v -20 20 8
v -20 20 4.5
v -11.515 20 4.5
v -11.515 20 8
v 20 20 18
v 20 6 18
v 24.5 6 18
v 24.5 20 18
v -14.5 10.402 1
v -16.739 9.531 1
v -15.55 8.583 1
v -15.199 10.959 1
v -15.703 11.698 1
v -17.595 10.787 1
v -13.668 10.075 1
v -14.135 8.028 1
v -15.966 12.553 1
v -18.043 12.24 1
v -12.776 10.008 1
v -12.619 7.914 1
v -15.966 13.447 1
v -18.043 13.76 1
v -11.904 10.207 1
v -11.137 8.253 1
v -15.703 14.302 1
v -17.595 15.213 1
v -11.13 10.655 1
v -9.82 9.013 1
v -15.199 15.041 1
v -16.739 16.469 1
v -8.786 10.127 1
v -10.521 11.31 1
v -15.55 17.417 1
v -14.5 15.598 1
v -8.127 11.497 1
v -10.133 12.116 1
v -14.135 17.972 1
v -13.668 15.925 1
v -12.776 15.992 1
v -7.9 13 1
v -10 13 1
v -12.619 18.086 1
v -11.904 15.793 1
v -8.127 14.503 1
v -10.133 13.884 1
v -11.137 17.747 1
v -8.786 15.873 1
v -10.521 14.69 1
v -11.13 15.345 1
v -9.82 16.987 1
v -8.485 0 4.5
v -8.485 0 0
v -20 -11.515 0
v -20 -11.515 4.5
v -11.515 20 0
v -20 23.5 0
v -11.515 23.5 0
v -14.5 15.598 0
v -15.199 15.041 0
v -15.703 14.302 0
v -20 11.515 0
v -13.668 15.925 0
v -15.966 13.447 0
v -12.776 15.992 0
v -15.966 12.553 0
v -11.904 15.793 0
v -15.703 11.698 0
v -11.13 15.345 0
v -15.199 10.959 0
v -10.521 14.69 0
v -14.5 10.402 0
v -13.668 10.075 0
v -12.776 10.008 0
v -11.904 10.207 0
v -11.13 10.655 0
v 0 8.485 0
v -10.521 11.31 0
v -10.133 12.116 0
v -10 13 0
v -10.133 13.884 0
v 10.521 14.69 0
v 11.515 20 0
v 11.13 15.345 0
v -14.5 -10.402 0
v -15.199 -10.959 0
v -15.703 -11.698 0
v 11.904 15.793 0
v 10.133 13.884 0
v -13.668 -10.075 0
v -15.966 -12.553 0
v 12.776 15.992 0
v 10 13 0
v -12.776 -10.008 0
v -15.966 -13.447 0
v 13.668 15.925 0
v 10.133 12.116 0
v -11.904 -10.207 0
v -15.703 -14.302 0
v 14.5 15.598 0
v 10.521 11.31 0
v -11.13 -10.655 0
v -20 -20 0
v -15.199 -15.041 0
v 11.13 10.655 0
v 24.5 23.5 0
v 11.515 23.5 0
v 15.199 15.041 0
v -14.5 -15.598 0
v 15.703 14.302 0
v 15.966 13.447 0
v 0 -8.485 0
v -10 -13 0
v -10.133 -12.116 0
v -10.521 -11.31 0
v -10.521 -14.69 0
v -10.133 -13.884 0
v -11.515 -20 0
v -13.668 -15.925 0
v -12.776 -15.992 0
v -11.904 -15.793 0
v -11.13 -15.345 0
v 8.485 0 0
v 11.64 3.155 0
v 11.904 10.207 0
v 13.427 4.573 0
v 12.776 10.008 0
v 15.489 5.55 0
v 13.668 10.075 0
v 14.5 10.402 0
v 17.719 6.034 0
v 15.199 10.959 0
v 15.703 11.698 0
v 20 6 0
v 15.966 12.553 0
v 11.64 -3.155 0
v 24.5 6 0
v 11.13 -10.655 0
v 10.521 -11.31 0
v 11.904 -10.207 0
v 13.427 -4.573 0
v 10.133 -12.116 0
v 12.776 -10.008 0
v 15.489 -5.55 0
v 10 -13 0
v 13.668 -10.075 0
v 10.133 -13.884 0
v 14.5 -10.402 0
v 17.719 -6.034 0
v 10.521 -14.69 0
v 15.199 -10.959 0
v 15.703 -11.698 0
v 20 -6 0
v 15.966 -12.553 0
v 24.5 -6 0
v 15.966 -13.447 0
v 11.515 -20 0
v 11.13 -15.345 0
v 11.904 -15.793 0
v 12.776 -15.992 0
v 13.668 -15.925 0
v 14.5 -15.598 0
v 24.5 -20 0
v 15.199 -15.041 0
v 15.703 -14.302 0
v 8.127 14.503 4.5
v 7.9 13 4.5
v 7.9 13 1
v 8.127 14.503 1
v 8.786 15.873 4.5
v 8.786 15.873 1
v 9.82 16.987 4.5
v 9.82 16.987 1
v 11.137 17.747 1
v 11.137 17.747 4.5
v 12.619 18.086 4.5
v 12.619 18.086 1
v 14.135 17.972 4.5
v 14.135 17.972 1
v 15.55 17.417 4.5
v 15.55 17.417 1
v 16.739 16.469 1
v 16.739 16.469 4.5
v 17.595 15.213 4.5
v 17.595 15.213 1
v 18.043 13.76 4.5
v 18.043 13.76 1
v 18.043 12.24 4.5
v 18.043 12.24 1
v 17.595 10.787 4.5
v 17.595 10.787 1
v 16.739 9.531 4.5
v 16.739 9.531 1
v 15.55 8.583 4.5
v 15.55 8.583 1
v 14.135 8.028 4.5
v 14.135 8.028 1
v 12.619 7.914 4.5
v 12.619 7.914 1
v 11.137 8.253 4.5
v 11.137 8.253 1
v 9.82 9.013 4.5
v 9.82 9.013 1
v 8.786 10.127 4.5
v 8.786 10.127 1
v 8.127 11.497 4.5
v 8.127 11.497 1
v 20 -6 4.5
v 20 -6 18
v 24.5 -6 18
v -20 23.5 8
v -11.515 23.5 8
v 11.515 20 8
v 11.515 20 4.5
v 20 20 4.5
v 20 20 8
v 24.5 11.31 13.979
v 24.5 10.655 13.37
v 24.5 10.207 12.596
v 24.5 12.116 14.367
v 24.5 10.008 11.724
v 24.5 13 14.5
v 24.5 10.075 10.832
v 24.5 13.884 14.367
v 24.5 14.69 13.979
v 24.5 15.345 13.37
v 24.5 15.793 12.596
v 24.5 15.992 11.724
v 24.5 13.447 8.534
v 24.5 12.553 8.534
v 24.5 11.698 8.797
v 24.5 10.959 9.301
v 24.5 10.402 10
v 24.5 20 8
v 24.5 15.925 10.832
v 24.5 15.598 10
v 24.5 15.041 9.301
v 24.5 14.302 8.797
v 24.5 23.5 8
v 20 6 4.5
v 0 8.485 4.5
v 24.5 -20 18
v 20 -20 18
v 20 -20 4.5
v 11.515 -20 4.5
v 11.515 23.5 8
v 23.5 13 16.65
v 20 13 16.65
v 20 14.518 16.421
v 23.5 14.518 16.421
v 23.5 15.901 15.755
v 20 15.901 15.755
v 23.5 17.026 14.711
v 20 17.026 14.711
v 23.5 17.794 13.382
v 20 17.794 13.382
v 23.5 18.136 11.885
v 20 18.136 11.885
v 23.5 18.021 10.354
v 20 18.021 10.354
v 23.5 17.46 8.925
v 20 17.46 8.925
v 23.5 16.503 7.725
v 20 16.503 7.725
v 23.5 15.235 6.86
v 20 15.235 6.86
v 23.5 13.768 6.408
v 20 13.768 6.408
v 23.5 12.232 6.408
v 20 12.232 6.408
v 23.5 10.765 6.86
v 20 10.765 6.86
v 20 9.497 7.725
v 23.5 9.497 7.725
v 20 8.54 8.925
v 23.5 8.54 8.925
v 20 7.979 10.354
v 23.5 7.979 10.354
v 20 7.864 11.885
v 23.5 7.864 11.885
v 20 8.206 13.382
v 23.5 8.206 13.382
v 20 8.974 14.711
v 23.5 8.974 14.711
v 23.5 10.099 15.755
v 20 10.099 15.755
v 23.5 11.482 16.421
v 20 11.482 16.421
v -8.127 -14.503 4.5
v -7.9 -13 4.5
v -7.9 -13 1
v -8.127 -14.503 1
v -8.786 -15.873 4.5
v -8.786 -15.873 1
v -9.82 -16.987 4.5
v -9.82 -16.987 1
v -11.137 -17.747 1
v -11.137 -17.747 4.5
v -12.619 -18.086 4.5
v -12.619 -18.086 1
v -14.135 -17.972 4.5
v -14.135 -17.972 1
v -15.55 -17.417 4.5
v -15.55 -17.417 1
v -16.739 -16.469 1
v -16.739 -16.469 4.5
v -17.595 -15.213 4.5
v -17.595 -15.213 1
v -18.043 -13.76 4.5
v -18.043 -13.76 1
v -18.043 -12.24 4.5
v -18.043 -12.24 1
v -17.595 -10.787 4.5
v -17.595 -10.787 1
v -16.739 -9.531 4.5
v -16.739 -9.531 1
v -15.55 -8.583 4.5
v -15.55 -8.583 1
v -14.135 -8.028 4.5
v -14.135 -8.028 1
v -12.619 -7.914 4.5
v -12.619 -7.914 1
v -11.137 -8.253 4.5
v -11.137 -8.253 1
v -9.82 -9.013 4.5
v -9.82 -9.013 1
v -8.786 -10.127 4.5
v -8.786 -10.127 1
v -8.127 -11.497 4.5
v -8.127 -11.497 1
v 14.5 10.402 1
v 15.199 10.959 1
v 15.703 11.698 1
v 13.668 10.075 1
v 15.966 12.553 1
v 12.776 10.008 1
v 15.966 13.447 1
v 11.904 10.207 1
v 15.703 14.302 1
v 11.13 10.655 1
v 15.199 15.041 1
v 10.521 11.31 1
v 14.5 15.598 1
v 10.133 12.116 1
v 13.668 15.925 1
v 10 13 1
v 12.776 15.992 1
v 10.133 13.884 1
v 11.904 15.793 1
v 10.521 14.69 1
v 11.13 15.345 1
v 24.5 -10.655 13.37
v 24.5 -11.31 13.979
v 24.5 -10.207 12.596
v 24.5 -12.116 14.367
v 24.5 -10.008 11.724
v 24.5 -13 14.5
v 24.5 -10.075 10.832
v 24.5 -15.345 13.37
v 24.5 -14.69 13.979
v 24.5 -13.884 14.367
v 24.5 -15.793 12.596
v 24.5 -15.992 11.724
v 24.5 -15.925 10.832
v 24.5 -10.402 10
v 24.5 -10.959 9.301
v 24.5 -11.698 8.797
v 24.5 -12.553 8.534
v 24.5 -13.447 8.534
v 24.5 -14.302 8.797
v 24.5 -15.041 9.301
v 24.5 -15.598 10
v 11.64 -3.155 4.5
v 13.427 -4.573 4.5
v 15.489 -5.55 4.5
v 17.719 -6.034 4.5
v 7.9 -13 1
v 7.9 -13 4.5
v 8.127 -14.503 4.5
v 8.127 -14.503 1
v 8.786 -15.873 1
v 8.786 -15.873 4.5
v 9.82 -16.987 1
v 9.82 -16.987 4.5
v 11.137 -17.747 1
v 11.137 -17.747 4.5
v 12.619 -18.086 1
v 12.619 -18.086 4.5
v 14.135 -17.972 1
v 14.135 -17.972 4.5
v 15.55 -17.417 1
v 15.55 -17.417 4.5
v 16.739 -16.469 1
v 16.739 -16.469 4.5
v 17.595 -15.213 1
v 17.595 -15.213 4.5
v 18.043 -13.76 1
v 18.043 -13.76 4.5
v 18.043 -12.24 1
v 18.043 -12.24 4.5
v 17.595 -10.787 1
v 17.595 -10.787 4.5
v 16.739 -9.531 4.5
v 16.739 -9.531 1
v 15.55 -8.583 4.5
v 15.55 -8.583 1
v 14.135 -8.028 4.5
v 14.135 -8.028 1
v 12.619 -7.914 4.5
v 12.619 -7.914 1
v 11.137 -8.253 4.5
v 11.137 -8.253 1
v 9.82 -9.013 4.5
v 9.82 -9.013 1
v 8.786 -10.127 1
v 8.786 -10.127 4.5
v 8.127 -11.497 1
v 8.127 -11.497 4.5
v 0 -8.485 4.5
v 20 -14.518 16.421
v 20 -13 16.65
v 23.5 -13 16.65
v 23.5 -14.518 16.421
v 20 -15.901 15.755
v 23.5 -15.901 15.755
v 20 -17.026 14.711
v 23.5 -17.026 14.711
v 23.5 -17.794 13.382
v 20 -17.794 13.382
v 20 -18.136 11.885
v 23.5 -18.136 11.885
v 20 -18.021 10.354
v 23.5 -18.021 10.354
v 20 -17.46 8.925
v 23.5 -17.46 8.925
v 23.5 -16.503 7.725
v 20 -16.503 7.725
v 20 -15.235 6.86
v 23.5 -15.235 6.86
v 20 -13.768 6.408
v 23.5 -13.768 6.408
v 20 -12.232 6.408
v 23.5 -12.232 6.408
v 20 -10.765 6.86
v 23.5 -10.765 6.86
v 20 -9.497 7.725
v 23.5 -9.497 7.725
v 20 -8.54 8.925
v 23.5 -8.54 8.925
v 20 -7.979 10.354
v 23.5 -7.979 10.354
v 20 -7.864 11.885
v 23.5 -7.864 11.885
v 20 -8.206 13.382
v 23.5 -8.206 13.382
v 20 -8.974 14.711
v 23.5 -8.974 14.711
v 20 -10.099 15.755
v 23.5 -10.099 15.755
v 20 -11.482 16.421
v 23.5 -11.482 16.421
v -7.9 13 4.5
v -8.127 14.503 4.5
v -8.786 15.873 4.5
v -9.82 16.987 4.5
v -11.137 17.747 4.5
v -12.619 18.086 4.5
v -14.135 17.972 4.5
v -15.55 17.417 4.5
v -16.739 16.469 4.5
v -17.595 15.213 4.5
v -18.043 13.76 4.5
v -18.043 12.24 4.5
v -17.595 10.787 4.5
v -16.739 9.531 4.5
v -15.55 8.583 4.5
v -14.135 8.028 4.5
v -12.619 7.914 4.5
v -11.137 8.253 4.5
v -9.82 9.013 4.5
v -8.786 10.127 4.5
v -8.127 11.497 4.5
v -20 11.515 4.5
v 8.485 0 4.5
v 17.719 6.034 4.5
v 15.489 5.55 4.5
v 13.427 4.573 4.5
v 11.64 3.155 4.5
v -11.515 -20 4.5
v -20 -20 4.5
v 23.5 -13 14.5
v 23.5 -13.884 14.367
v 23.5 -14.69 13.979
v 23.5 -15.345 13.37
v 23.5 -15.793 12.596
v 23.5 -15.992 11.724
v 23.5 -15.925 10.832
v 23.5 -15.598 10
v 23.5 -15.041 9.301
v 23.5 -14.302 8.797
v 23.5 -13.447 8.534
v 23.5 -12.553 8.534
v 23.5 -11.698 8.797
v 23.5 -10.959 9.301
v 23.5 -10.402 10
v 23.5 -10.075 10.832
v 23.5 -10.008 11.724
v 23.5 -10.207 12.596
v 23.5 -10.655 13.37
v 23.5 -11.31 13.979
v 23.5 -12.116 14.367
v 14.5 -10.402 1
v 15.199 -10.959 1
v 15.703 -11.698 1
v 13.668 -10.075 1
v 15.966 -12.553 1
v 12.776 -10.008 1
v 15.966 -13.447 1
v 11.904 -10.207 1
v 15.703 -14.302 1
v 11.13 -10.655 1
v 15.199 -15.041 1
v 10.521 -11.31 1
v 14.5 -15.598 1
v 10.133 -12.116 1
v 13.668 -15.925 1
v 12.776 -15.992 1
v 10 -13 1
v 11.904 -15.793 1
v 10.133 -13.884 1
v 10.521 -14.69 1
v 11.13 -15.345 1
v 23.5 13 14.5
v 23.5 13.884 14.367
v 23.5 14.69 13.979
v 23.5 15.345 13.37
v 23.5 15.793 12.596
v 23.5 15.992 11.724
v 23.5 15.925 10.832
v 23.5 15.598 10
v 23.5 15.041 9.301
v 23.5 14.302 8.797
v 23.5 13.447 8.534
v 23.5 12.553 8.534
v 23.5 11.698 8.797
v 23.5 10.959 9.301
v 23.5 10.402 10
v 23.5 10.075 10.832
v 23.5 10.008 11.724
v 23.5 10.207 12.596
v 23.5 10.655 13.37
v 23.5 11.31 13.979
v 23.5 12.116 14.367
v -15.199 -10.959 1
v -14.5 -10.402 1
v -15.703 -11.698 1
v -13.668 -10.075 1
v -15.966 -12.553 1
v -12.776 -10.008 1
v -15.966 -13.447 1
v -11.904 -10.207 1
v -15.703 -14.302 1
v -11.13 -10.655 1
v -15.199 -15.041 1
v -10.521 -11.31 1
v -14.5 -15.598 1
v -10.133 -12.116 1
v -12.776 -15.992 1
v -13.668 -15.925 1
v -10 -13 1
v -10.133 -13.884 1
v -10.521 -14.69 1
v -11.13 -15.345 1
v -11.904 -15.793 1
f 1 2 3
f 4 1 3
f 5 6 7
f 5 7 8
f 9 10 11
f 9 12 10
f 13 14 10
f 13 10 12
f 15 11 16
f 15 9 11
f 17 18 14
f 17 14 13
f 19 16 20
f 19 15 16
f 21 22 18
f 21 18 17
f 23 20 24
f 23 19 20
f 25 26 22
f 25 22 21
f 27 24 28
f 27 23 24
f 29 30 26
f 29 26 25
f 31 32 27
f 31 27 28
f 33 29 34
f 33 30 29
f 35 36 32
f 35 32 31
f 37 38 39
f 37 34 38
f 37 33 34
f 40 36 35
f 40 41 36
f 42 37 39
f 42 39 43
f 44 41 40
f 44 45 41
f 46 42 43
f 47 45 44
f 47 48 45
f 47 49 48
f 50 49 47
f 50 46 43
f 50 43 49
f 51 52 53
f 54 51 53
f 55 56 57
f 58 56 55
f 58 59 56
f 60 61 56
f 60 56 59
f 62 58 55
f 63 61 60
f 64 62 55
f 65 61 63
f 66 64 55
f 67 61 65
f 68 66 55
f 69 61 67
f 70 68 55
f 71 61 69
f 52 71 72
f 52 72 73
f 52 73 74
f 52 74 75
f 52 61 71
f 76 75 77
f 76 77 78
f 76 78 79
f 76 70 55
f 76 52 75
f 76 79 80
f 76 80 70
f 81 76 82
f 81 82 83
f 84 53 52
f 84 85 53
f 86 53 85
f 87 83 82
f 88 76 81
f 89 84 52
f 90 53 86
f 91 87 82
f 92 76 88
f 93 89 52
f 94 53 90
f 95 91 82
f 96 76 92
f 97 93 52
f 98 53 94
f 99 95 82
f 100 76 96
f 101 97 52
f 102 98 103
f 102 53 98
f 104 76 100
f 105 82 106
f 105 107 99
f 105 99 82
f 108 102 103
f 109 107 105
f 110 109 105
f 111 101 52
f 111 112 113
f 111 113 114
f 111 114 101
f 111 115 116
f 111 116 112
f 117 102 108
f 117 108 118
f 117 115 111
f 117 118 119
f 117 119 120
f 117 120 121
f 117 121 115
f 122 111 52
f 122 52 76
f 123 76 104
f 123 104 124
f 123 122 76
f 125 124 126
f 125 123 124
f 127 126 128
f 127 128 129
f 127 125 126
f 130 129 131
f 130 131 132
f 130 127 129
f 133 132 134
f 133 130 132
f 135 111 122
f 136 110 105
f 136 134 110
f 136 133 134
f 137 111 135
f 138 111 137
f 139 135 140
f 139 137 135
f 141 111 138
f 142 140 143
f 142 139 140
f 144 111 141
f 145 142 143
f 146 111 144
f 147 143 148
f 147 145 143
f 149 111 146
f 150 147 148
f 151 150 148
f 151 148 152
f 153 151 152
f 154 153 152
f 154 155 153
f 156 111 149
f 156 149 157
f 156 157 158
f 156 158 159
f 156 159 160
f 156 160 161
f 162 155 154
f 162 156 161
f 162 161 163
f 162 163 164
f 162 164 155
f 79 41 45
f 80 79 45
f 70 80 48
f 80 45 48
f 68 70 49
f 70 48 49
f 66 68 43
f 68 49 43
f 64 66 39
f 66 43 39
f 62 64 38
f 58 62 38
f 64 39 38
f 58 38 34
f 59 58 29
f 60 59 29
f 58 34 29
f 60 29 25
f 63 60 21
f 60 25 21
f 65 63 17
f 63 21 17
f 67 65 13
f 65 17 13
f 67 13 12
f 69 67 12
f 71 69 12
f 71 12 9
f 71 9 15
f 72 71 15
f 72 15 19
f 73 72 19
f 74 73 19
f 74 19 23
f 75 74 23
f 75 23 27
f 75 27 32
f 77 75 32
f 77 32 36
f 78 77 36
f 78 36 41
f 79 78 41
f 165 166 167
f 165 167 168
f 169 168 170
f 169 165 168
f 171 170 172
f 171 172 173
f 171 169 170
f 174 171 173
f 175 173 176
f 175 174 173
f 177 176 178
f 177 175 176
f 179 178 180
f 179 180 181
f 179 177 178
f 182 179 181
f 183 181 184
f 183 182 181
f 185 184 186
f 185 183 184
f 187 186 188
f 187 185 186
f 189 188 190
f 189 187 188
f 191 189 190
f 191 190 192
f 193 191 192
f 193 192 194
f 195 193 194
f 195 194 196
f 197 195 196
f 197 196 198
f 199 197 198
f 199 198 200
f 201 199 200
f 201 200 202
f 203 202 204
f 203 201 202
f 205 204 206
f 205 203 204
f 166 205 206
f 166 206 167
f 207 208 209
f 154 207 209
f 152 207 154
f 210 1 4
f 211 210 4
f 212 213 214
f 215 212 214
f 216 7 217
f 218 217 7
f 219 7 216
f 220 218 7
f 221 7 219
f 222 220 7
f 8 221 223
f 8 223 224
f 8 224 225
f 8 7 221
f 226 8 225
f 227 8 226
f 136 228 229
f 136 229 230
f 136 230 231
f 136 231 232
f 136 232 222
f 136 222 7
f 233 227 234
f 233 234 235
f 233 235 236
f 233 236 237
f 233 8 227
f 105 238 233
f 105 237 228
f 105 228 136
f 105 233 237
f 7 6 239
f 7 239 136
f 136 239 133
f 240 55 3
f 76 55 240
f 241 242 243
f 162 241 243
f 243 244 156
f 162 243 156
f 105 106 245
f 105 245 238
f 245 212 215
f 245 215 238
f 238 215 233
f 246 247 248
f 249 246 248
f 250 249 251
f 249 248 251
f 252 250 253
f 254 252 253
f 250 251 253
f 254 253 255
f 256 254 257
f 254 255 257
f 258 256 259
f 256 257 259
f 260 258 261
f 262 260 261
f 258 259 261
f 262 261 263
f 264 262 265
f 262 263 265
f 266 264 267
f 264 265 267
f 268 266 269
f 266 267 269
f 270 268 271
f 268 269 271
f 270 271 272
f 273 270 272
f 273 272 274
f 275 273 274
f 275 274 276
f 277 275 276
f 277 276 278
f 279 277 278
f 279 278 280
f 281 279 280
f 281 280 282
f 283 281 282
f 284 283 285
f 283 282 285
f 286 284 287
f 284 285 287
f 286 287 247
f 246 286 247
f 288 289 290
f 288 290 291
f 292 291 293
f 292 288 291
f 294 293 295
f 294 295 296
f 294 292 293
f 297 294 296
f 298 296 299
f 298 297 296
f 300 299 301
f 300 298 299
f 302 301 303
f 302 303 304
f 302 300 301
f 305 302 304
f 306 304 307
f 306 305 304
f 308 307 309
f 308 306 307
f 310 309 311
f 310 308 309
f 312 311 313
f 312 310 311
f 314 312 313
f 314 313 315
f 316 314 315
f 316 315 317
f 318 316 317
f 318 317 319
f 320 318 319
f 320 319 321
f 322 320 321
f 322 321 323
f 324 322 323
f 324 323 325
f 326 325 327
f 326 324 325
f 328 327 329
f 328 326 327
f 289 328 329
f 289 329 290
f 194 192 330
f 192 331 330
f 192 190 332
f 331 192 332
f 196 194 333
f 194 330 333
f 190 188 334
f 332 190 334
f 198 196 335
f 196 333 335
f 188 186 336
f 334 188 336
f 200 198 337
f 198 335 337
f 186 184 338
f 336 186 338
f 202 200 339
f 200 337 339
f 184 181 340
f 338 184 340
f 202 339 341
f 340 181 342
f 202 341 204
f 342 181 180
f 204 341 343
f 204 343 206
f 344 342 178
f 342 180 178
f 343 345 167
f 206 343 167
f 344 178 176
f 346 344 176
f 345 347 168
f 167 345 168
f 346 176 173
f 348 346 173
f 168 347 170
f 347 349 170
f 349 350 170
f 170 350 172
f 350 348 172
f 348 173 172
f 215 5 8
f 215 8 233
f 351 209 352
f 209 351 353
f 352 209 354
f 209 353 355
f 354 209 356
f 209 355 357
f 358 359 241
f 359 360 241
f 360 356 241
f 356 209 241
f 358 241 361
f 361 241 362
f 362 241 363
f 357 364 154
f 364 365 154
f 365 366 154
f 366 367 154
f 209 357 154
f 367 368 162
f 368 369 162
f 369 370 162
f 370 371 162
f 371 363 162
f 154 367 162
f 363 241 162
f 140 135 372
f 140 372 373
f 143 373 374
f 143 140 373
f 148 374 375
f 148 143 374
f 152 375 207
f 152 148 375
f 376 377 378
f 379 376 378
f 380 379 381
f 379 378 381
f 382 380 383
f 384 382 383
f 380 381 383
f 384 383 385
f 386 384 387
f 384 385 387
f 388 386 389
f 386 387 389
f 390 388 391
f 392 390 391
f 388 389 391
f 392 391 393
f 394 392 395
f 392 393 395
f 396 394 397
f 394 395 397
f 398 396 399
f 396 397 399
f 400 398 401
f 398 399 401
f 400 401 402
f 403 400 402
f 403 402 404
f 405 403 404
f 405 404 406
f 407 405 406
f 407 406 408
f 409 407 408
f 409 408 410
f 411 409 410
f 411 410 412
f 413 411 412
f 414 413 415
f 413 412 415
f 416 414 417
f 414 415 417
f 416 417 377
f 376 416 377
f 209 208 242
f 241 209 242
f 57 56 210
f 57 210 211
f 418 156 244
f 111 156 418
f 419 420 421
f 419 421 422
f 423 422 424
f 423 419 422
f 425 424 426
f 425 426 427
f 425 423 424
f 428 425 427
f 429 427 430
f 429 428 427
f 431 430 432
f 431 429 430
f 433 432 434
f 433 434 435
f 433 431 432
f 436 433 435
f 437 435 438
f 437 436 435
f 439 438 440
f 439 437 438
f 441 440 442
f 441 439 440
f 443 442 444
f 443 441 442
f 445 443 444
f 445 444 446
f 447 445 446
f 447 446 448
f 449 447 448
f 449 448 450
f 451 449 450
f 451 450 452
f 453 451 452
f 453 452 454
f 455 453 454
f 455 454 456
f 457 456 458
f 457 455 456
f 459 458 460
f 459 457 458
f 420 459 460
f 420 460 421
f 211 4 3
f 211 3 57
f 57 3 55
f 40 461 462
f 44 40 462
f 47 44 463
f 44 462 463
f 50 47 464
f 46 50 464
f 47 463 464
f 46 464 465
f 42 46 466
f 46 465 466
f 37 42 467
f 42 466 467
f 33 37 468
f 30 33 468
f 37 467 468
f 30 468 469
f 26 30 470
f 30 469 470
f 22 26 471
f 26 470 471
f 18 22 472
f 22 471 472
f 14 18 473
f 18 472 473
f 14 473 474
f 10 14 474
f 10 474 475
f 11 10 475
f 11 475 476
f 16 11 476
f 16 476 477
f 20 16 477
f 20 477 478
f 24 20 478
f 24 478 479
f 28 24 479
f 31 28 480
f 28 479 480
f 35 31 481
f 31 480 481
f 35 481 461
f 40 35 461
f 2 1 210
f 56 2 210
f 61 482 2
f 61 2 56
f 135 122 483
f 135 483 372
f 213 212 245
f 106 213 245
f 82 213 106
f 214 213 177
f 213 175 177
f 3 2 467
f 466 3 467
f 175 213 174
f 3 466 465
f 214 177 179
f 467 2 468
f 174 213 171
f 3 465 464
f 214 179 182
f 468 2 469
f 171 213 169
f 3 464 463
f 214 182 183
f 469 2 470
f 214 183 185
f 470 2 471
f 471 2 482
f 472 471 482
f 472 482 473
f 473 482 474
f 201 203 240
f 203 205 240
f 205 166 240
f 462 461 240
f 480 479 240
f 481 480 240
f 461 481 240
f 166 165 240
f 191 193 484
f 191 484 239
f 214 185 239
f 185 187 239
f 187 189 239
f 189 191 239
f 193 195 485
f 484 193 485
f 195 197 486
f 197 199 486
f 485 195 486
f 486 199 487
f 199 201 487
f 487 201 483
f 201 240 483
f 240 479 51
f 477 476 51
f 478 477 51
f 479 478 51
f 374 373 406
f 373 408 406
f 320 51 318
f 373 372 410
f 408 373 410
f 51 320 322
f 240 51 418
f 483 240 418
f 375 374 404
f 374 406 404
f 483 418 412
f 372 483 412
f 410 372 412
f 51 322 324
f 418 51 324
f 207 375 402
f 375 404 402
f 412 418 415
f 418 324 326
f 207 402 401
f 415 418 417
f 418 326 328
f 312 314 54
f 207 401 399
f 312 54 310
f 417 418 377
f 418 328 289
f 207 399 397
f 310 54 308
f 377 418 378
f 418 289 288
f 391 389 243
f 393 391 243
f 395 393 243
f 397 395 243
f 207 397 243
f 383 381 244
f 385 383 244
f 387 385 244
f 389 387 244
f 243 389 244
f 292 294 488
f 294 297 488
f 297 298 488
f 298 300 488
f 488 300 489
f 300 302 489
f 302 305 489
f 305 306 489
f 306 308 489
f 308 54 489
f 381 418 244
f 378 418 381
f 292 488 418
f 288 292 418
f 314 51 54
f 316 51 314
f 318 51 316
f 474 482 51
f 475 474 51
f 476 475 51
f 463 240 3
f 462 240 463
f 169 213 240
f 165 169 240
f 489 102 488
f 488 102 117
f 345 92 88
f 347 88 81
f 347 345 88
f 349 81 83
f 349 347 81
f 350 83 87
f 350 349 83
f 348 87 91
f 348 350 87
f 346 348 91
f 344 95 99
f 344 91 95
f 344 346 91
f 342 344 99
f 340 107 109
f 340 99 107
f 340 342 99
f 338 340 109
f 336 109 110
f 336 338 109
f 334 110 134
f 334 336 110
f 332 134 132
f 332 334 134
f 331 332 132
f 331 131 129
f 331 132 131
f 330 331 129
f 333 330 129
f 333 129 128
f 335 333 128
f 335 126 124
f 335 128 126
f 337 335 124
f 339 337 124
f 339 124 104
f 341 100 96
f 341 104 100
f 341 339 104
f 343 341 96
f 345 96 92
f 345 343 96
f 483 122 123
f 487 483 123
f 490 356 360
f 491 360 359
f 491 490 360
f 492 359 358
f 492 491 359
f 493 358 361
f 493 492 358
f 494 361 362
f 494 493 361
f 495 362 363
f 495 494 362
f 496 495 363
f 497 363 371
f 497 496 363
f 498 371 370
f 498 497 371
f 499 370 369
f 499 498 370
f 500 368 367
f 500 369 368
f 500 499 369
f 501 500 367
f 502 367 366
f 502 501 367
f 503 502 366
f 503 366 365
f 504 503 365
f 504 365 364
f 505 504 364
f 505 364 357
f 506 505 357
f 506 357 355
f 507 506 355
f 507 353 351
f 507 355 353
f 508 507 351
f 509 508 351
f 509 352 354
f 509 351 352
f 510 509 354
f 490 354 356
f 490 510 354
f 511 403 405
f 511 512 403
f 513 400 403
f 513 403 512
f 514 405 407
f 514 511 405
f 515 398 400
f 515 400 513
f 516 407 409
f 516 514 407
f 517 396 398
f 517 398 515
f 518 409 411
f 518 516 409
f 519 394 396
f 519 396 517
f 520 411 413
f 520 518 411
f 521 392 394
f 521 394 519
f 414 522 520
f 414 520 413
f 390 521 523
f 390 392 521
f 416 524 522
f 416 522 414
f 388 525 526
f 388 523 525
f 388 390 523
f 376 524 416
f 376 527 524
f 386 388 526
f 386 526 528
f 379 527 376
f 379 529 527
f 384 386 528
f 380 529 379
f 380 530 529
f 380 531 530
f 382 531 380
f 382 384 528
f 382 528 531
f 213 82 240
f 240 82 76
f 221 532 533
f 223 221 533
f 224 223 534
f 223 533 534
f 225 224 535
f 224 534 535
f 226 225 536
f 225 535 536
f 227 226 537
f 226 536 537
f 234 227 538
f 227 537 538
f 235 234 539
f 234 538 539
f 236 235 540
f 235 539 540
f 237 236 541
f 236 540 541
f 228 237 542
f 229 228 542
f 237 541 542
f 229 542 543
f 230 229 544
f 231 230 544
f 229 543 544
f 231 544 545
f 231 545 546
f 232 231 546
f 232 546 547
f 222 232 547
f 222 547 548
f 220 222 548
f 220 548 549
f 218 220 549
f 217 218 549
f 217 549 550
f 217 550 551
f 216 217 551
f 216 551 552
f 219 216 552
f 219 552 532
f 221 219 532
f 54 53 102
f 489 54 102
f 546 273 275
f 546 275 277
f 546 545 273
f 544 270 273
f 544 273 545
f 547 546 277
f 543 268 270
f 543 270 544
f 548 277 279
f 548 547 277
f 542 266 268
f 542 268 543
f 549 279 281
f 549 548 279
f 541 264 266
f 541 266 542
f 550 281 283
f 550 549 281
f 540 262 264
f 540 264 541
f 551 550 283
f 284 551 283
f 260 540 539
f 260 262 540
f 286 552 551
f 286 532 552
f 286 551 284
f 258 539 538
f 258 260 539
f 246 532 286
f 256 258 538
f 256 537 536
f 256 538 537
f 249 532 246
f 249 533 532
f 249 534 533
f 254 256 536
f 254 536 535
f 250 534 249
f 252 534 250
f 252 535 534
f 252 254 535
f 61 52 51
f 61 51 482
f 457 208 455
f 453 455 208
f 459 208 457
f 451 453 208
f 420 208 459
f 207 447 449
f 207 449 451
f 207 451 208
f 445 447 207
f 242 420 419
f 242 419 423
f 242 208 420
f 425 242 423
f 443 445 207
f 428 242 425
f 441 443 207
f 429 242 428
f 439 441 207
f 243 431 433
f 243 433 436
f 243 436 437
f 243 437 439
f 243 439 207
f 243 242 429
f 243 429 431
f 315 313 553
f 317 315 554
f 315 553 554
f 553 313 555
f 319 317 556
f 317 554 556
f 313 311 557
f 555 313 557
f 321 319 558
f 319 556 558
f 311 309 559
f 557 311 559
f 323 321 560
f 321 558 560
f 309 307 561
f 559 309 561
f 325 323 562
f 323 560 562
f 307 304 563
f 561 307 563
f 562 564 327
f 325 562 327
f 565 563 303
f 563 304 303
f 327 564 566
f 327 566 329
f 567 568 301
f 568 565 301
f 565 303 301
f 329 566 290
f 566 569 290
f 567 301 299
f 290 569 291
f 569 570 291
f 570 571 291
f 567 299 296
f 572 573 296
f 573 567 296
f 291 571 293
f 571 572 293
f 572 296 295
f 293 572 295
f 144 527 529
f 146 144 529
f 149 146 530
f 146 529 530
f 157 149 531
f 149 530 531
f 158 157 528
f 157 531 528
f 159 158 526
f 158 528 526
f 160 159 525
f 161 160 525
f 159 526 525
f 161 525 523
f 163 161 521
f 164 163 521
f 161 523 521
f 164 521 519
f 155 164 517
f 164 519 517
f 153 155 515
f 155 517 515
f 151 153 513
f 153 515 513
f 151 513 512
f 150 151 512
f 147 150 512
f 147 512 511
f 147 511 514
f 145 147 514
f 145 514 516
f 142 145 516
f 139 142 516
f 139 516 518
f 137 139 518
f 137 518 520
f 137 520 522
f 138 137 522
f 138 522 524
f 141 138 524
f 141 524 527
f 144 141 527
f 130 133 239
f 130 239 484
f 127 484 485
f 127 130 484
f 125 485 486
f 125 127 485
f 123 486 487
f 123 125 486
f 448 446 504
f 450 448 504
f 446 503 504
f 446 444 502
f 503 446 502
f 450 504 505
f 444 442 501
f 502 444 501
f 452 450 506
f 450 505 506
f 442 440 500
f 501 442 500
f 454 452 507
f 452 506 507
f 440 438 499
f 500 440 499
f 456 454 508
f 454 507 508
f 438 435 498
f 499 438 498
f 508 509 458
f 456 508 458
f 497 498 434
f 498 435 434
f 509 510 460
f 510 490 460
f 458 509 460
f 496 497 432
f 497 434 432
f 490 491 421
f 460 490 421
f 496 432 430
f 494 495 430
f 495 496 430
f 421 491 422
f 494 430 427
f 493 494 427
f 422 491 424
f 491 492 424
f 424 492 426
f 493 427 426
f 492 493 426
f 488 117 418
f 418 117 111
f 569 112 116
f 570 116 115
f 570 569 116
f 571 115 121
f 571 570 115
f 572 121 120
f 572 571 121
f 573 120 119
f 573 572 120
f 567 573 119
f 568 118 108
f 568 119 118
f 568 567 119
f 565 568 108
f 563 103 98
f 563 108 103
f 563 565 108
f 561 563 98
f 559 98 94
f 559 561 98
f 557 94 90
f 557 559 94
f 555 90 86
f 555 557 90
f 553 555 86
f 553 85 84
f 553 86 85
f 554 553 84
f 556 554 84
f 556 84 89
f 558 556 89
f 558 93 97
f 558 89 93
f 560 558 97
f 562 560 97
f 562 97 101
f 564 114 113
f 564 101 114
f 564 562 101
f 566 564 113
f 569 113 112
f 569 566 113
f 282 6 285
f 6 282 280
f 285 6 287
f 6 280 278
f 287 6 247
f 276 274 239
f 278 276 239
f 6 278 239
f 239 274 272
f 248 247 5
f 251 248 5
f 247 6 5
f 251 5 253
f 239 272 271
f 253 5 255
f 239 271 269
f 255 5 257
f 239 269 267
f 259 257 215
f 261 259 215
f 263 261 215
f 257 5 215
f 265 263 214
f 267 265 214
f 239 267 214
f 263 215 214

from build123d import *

# Parameters (mm, degrees)
RESSALTO_EXTRUS_O1_DEPTH  = 4.5
ESBO_O2_R                 = 5.1
CORTE_EXTRUS_O1_DEPTH     = 3.5
ESBO_O3_R                 = 3
CORTE_EXTRUS_O2_DEPTH     = 3.5
ESPELHAR2_COPY_1_DEPTH    = 4.5
ESPELHAR2_COPY_2_SKETCH_R = 5.1
ESPELHAR2_COPY_2_DEPTH    = 3.5
ESPELHAR2_COPY_3_SKETCH_R = 3
ESPELHAR2_COPY_3_DEPTH    = 3.5
ESBO_O5_W                 = 18
ESBO_O5_H                 = 14
RESSALTO_EXTRUS_O2_DEPTH  = 4.5
ESBO_O6_R                 = 5.15
CORTE_EXTRUS_O3_DEPTH     = 3.5
ESBO_O7_R                 = 3
CORTE_EXTRUS_O4_DEPTH     = 3.5
FILETE1_R                 = 10
ESBO_O8_W                 = 8.485281374
ESBO_O8_H                 = 8
ESBO_O8_W_2               = 12.985281374
RESSALTO_EXTRUS_O3_DEPTH  = 3.5


with BuildPart() as part:
    # Esboço1 → Ressalto-extrusão1 (new body)
    with BuildSketch(Plane.XY):
        Polygon((-8.485281374, 0), (-20, 11.514718626), (-20, 20), (-11.514718626, 20), (0, 8.485281374), (0, 0), align=None)
    ressalto_extrus_o1 = extrude(amount=RESSALTO_EXTRUS_O1_DEPTH)

    # Esboço2 → Corte-extrusão1 (cut)
    with BuildSketch(Plane.XY.offset(4.5)):
        with Locations((-13, 13)):
            Circle(ESBO_O2_R)
    corte_extrus_o1 = extrude(amount=-CORTE_EXTRUS_O1_DEPTH, mode=Mode.SUBTRACT)

    # Esboço3 → Corte-extrusão2 (cut)
    with BuildSketch(Plane.XY.offset(1)):
        with Locations((-13, 13)):
            Circle(ESBO_O3_R)
    corte_extrus_o2 = extrude(amount=-CORTE_EXTRUS_O2_DEPTH, mode=Mode.SUBTRACT)

    # Espelhar1: Ressalto-extrusão1, Corte-extrusão1, Corte-extrusão2 across plane
    add(ressalto_extrus_o1.mirror(Plane(origin=(0, 0, 0), x_dir=(0, 0, 1), z_dir=(1, 0, 0))))
    add(corte_extrus_o1.mirror(Plane(origin=(0, 0, 0), x_dir=(0, 0, 1), z_dir=(1, 0, 0))), mode=Mode.SUBTRACT)
    add(corte_extrus_o2.mirror(Plane(origin=(0, 0, 0), x_dir=(0, 0, 1), z_dir=(1, 0, 0))), mode=Mode.SUBTRACT)

    # Espelhar2: Ressalto-extrusão1, Corte-extrusão1, Corte-extrusão2 across plane
    add(ressalto_extrus_o1.mirror(Plane.ZX))
    add(corte_extrus_o1.mirror(Plane.ZX), mode=Mode.SUBTRACT)
    add(corte_extrus_o2.mirror(Plane.ZX), mode=Mode.SUBTRACT)

    # Espelhar2 copy 1 sketch → Espelhar2 copy 1 (add)
    with BuildSketch(Plane(origin=(0, 0, 0), x_dir=(-1, 0, 0), z_dir=(0, 0, 1))):
        Polygon((-8.485281374, 0), (-20, 11.514718626), (-20, 20), (-11.514718626, 20), (0, 8.485281374), (0, 0), align=None)
    extrude(amount=ESPELHAR2_COPY_1_DEPTH)

    # Espelhar2 copy 2 sketch → Espelhar2 copy 2 (cut)
    with BuildSketch(Plane(origin=(0, 0, 4.5), x_dir=(-1, 0, 0), z_dir=(0, 0, 1))):
        with Locations((-13, 13)):
            Circle(ESPELHAR2_COPY_2_SKETCH_R)
    extrude(amount=-ESPELHAR2_COPY_2_DEPTH, mode=Mode.SUBTRACT)

    # Espelhar2 copy 3 sketch → Espelhar2 copy 3 (cut)
    with BuildSketch(Plane(origin=(0, 0, 1), x_dir=(-1, 0, 0), z_dir=(0, 0, 1))):
        with Locations((-13, 13)):
            Circle(ESPELHAR2_COPY_3_SKETCH_R)
    extrude(amount=-ESPELHAR2_COPY_3_DEPTH, mode=Mode.SUBTRACT)

    # Esboço5 → Ressalto-extrusão2 (add)
    with BuildSketch(Plane(origin=(20, 0, 0), x_dir=(0, 0, -1), z_dir=(1, 0, 0))):
        with Locations((-9, 13)):
            Rectangle(ESBO_O5_W, ESBO_O5_H)
    ressalto_extrus_o2 = extrude(amount=RESSALTO_EXTRUS_O2_DEPTH)

    # Esboço6 → Corte-extrusão3 (cut)
    with BuildSketch(Plane.ZY.offset(-20)):
        with Locations((11.5, 13)):
            Circle(ESBO_O6_R)
    corte_extrus_o3 = extrude(amount=-CORTE_EXTRUS_O3_DEPTH, mode=Mode.SUBTRACT)

    # Esboço7 → Corte-extrusão4 (cut)
    with BuildSketch(Plane.ZY.offset(-23.5)):
        with Locations((11.5, 13)):
            Circle(ESBO_O7_R)
    corte_extrus_o4 = extrude(amount=-CORTE_EXTRUS_O4_DEPTH, mode=Mode.SUBTRACT)

    # Espelhar3: Ressalto-extrusão2, Corte-extrusão3, Corte-extrusão4 across plane
    add(ressalto_extrus_o2.mirror(Plane.ZX))
    add(corte_extrus_o3.mirror(Plane.ZX), mode=Mode.SUBTRACT)
    add(corte_extrus_o4.mirror(Plane.ZX), mode=Mode.SUBTRACT)

    # Filete1
    # the kernel refuses this fillet: 10 mm, written as the material it adds along each edge
    with BuildSketch(Plane(origin=(20, 11.514718626, 0), x_dir=(0, -1, 0), z_dir=(0, 0, 1))) as filete1_piece_1:
        with BuildLine():
            CenterArc((15.431276309, -1.289140686), FILETE1_R, 172.593154991, 52.406845009)
            Line((8.360208498, -8.360208498), (0, 0))
            Line((0, 0), (5.514718626, 0))
        make_face()
    extrude(amount=4.5)
    with BuildSketch(Plane(origin=(20, -11.514718626, 0), x_dir=(-0.7071067811865462, 0.7071067811865488, 0), z_dir=(0, 0, 1))) as filete1_piece_2:
        with BuildLine():
            CenterArc((11.823120241, -10), FILETE1_R, 90, 52.406845009)
            Line((3.899494937, -3.899494937), (0, 0))
            Line((0, 0), (11.823120241, 0))
        make_face()
    extrude(amount=4.5)

    # Esboço8 → Ressalto-extrusão3 (add)
    with BuildSketch(Plane(origin=(0, 20, 0), x_dir=(1, 0, 0), z_dir=(0, 1, 0))):
        with Locations((-15.757359313, -4)):
            Rectangle(ESBO_O8_W, ESBO_O8_H)
        with Locations((18.007359313, -4)):
            Rectangle(ESBO_O8_W_2, ESBO_O8_H)
    extrude(amount=RESSALTO_EXTRUS_O3_DEPTH)


solid = part.part
